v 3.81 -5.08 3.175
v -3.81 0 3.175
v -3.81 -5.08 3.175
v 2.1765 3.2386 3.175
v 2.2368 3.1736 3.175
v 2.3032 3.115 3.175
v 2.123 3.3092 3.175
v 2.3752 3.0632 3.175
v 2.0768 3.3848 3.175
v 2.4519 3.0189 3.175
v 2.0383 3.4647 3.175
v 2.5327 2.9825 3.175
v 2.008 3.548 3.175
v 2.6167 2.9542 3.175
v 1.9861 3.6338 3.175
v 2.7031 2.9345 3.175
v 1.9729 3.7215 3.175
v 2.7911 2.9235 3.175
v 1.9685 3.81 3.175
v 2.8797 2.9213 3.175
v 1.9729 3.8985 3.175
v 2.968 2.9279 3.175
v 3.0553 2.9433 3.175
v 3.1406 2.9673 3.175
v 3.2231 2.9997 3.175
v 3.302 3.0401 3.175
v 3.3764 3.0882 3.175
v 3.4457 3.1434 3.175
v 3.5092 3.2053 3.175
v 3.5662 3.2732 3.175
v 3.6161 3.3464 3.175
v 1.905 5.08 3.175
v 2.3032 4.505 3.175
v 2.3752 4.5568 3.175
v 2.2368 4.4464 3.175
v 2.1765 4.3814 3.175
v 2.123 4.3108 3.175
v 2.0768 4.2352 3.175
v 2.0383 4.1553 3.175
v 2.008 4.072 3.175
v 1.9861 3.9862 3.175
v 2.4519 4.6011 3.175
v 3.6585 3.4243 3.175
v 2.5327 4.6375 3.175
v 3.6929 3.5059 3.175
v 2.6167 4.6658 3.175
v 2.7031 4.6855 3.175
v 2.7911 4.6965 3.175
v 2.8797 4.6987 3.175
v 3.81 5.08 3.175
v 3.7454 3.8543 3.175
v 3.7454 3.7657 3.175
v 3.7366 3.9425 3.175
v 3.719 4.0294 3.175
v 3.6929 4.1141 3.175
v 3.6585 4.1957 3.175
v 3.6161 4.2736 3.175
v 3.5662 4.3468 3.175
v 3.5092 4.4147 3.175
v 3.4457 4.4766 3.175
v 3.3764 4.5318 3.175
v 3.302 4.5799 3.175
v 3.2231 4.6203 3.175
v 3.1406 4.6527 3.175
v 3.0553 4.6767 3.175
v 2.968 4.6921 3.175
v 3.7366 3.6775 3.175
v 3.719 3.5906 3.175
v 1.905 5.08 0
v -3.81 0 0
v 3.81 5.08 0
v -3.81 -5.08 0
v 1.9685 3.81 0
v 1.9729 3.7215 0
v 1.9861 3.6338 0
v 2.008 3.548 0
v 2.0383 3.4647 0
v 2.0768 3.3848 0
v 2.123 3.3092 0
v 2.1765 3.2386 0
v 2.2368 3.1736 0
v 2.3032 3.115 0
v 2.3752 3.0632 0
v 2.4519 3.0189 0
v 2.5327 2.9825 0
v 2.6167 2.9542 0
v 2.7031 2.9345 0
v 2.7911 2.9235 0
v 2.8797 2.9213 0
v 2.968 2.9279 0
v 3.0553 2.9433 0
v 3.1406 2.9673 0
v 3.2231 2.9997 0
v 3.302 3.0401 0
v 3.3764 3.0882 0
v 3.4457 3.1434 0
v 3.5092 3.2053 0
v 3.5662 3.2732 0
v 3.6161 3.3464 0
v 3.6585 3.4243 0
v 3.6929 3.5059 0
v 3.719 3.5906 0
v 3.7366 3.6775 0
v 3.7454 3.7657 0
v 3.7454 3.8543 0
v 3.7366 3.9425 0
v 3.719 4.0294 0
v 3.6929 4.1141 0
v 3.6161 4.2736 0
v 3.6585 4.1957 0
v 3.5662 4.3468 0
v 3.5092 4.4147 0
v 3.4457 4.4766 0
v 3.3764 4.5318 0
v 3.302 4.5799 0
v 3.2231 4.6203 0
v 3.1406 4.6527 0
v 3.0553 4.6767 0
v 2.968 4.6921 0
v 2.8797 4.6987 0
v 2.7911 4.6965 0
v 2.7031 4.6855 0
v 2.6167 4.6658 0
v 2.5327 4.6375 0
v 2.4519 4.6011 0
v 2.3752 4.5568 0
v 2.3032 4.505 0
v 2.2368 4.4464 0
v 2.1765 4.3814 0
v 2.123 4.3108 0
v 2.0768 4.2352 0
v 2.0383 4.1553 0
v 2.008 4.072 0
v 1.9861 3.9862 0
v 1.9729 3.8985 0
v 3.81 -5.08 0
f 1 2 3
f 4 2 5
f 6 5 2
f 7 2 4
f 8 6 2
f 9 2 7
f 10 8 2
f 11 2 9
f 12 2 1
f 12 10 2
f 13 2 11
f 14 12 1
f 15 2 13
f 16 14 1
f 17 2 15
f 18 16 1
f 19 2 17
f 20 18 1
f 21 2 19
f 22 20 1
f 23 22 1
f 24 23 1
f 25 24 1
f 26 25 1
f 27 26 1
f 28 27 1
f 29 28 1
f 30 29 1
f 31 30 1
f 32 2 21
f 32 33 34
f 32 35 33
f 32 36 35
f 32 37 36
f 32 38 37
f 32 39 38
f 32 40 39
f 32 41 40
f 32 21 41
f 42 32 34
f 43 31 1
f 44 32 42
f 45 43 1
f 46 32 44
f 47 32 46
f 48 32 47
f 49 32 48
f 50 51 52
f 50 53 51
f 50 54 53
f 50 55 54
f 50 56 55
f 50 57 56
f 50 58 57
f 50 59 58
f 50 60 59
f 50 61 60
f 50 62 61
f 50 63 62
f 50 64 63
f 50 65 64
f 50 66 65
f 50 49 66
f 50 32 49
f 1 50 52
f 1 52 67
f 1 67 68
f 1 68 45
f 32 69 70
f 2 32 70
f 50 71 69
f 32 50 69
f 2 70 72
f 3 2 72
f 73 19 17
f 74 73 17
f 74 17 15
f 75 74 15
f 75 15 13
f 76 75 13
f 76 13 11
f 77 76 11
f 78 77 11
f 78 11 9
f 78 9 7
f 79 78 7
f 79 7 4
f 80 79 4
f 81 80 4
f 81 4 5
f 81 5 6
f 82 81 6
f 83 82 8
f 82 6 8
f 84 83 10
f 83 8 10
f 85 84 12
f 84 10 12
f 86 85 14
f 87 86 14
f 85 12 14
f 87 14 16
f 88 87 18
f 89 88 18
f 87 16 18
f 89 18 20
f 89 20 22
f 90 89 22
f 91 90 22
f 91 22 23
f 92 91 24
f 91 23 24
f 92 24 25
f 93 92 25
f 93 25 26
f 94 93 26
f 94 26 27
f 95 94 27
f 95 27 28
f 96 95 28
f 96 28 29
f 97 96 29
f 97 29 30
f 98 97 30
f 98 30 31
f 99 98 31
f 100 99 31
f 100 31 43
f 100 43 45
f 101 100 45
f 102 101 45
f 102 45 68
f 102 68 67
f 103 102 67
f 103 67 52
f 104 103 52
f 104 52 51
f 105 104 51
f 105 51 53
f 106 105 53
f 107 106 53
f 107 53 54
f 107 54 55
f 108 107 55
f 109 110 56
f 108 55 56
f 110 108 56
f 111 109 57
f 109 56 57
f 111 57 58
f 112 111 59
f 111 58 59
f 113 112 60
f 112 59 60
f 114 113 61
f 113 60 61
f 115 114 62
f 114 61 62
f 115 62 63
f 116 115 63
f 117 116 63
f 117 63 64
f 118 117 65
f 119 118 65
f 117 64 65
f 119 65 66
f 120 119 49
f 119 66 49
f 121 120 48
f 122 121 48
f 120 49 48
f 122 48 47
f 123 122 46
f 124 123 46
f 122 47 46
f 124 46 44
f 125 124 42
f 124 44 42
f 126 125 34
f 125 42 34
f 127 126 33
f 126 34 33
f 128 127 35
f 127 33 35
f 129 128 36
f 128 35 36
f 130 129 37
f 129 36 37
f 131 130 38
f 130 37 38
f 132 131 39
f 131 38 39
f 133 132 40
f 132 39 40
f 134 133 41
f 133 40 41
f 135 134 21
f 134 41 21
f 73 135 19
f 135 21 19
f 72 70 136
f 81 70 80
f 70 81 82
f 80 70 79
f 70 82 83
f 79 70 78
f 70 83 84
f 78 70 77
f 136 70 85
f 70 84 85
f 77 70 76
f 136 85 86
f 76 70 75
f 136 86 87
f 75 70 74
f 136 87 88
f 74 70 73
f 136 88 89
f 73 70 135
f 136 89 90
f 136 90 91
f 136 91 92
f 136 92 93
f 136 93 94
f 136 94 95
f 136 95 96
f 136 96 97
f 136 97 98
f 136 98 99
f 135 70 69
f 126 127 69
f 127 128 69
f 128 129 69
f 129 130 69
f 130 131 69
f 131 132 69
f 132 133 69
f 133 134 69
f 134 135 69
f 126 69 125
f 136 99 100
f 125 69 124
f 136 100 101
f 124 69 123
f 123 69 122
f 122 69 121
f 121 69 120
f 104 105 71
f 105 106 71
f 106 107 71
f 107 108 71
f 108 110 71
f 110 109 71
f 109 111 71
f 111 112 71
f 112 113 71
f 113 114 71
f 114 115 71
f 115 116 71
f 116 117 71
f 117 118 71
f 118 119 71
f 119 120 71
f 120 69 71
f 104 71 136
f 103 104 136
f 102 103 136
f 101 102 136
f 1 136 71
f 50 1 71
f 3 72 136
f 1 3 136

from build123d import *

# Parameters (mm, degrees)
F1_DEPTH = 3.175
F2_D     = 1.778


with BuildPart() as f1:
    # F0 (on Top) → F1 (new body)
    with BuildSketch(Plane.XY):
        Polygon((-3.81, -5.08), (3.81, -5.08), (3.81, 0), (3.81, 2.54), (1.905, 5.08), (-3.81, 0), align=None)
        Polygon((1.905, 5.08), (3.81, 2.54), (3.81, 5.08), align=None)
    extrude(amount=F1_DEPTH)

    # F2 (through all)
    with Locations(Plane(origin=(0, 0, 0), x_dir=(1, 0, 0), z_dir=(0, 0, -1))):
        with Locations((2.8575, -3.81)):
            Hole(F2_D / 2)


solid = f1.part
